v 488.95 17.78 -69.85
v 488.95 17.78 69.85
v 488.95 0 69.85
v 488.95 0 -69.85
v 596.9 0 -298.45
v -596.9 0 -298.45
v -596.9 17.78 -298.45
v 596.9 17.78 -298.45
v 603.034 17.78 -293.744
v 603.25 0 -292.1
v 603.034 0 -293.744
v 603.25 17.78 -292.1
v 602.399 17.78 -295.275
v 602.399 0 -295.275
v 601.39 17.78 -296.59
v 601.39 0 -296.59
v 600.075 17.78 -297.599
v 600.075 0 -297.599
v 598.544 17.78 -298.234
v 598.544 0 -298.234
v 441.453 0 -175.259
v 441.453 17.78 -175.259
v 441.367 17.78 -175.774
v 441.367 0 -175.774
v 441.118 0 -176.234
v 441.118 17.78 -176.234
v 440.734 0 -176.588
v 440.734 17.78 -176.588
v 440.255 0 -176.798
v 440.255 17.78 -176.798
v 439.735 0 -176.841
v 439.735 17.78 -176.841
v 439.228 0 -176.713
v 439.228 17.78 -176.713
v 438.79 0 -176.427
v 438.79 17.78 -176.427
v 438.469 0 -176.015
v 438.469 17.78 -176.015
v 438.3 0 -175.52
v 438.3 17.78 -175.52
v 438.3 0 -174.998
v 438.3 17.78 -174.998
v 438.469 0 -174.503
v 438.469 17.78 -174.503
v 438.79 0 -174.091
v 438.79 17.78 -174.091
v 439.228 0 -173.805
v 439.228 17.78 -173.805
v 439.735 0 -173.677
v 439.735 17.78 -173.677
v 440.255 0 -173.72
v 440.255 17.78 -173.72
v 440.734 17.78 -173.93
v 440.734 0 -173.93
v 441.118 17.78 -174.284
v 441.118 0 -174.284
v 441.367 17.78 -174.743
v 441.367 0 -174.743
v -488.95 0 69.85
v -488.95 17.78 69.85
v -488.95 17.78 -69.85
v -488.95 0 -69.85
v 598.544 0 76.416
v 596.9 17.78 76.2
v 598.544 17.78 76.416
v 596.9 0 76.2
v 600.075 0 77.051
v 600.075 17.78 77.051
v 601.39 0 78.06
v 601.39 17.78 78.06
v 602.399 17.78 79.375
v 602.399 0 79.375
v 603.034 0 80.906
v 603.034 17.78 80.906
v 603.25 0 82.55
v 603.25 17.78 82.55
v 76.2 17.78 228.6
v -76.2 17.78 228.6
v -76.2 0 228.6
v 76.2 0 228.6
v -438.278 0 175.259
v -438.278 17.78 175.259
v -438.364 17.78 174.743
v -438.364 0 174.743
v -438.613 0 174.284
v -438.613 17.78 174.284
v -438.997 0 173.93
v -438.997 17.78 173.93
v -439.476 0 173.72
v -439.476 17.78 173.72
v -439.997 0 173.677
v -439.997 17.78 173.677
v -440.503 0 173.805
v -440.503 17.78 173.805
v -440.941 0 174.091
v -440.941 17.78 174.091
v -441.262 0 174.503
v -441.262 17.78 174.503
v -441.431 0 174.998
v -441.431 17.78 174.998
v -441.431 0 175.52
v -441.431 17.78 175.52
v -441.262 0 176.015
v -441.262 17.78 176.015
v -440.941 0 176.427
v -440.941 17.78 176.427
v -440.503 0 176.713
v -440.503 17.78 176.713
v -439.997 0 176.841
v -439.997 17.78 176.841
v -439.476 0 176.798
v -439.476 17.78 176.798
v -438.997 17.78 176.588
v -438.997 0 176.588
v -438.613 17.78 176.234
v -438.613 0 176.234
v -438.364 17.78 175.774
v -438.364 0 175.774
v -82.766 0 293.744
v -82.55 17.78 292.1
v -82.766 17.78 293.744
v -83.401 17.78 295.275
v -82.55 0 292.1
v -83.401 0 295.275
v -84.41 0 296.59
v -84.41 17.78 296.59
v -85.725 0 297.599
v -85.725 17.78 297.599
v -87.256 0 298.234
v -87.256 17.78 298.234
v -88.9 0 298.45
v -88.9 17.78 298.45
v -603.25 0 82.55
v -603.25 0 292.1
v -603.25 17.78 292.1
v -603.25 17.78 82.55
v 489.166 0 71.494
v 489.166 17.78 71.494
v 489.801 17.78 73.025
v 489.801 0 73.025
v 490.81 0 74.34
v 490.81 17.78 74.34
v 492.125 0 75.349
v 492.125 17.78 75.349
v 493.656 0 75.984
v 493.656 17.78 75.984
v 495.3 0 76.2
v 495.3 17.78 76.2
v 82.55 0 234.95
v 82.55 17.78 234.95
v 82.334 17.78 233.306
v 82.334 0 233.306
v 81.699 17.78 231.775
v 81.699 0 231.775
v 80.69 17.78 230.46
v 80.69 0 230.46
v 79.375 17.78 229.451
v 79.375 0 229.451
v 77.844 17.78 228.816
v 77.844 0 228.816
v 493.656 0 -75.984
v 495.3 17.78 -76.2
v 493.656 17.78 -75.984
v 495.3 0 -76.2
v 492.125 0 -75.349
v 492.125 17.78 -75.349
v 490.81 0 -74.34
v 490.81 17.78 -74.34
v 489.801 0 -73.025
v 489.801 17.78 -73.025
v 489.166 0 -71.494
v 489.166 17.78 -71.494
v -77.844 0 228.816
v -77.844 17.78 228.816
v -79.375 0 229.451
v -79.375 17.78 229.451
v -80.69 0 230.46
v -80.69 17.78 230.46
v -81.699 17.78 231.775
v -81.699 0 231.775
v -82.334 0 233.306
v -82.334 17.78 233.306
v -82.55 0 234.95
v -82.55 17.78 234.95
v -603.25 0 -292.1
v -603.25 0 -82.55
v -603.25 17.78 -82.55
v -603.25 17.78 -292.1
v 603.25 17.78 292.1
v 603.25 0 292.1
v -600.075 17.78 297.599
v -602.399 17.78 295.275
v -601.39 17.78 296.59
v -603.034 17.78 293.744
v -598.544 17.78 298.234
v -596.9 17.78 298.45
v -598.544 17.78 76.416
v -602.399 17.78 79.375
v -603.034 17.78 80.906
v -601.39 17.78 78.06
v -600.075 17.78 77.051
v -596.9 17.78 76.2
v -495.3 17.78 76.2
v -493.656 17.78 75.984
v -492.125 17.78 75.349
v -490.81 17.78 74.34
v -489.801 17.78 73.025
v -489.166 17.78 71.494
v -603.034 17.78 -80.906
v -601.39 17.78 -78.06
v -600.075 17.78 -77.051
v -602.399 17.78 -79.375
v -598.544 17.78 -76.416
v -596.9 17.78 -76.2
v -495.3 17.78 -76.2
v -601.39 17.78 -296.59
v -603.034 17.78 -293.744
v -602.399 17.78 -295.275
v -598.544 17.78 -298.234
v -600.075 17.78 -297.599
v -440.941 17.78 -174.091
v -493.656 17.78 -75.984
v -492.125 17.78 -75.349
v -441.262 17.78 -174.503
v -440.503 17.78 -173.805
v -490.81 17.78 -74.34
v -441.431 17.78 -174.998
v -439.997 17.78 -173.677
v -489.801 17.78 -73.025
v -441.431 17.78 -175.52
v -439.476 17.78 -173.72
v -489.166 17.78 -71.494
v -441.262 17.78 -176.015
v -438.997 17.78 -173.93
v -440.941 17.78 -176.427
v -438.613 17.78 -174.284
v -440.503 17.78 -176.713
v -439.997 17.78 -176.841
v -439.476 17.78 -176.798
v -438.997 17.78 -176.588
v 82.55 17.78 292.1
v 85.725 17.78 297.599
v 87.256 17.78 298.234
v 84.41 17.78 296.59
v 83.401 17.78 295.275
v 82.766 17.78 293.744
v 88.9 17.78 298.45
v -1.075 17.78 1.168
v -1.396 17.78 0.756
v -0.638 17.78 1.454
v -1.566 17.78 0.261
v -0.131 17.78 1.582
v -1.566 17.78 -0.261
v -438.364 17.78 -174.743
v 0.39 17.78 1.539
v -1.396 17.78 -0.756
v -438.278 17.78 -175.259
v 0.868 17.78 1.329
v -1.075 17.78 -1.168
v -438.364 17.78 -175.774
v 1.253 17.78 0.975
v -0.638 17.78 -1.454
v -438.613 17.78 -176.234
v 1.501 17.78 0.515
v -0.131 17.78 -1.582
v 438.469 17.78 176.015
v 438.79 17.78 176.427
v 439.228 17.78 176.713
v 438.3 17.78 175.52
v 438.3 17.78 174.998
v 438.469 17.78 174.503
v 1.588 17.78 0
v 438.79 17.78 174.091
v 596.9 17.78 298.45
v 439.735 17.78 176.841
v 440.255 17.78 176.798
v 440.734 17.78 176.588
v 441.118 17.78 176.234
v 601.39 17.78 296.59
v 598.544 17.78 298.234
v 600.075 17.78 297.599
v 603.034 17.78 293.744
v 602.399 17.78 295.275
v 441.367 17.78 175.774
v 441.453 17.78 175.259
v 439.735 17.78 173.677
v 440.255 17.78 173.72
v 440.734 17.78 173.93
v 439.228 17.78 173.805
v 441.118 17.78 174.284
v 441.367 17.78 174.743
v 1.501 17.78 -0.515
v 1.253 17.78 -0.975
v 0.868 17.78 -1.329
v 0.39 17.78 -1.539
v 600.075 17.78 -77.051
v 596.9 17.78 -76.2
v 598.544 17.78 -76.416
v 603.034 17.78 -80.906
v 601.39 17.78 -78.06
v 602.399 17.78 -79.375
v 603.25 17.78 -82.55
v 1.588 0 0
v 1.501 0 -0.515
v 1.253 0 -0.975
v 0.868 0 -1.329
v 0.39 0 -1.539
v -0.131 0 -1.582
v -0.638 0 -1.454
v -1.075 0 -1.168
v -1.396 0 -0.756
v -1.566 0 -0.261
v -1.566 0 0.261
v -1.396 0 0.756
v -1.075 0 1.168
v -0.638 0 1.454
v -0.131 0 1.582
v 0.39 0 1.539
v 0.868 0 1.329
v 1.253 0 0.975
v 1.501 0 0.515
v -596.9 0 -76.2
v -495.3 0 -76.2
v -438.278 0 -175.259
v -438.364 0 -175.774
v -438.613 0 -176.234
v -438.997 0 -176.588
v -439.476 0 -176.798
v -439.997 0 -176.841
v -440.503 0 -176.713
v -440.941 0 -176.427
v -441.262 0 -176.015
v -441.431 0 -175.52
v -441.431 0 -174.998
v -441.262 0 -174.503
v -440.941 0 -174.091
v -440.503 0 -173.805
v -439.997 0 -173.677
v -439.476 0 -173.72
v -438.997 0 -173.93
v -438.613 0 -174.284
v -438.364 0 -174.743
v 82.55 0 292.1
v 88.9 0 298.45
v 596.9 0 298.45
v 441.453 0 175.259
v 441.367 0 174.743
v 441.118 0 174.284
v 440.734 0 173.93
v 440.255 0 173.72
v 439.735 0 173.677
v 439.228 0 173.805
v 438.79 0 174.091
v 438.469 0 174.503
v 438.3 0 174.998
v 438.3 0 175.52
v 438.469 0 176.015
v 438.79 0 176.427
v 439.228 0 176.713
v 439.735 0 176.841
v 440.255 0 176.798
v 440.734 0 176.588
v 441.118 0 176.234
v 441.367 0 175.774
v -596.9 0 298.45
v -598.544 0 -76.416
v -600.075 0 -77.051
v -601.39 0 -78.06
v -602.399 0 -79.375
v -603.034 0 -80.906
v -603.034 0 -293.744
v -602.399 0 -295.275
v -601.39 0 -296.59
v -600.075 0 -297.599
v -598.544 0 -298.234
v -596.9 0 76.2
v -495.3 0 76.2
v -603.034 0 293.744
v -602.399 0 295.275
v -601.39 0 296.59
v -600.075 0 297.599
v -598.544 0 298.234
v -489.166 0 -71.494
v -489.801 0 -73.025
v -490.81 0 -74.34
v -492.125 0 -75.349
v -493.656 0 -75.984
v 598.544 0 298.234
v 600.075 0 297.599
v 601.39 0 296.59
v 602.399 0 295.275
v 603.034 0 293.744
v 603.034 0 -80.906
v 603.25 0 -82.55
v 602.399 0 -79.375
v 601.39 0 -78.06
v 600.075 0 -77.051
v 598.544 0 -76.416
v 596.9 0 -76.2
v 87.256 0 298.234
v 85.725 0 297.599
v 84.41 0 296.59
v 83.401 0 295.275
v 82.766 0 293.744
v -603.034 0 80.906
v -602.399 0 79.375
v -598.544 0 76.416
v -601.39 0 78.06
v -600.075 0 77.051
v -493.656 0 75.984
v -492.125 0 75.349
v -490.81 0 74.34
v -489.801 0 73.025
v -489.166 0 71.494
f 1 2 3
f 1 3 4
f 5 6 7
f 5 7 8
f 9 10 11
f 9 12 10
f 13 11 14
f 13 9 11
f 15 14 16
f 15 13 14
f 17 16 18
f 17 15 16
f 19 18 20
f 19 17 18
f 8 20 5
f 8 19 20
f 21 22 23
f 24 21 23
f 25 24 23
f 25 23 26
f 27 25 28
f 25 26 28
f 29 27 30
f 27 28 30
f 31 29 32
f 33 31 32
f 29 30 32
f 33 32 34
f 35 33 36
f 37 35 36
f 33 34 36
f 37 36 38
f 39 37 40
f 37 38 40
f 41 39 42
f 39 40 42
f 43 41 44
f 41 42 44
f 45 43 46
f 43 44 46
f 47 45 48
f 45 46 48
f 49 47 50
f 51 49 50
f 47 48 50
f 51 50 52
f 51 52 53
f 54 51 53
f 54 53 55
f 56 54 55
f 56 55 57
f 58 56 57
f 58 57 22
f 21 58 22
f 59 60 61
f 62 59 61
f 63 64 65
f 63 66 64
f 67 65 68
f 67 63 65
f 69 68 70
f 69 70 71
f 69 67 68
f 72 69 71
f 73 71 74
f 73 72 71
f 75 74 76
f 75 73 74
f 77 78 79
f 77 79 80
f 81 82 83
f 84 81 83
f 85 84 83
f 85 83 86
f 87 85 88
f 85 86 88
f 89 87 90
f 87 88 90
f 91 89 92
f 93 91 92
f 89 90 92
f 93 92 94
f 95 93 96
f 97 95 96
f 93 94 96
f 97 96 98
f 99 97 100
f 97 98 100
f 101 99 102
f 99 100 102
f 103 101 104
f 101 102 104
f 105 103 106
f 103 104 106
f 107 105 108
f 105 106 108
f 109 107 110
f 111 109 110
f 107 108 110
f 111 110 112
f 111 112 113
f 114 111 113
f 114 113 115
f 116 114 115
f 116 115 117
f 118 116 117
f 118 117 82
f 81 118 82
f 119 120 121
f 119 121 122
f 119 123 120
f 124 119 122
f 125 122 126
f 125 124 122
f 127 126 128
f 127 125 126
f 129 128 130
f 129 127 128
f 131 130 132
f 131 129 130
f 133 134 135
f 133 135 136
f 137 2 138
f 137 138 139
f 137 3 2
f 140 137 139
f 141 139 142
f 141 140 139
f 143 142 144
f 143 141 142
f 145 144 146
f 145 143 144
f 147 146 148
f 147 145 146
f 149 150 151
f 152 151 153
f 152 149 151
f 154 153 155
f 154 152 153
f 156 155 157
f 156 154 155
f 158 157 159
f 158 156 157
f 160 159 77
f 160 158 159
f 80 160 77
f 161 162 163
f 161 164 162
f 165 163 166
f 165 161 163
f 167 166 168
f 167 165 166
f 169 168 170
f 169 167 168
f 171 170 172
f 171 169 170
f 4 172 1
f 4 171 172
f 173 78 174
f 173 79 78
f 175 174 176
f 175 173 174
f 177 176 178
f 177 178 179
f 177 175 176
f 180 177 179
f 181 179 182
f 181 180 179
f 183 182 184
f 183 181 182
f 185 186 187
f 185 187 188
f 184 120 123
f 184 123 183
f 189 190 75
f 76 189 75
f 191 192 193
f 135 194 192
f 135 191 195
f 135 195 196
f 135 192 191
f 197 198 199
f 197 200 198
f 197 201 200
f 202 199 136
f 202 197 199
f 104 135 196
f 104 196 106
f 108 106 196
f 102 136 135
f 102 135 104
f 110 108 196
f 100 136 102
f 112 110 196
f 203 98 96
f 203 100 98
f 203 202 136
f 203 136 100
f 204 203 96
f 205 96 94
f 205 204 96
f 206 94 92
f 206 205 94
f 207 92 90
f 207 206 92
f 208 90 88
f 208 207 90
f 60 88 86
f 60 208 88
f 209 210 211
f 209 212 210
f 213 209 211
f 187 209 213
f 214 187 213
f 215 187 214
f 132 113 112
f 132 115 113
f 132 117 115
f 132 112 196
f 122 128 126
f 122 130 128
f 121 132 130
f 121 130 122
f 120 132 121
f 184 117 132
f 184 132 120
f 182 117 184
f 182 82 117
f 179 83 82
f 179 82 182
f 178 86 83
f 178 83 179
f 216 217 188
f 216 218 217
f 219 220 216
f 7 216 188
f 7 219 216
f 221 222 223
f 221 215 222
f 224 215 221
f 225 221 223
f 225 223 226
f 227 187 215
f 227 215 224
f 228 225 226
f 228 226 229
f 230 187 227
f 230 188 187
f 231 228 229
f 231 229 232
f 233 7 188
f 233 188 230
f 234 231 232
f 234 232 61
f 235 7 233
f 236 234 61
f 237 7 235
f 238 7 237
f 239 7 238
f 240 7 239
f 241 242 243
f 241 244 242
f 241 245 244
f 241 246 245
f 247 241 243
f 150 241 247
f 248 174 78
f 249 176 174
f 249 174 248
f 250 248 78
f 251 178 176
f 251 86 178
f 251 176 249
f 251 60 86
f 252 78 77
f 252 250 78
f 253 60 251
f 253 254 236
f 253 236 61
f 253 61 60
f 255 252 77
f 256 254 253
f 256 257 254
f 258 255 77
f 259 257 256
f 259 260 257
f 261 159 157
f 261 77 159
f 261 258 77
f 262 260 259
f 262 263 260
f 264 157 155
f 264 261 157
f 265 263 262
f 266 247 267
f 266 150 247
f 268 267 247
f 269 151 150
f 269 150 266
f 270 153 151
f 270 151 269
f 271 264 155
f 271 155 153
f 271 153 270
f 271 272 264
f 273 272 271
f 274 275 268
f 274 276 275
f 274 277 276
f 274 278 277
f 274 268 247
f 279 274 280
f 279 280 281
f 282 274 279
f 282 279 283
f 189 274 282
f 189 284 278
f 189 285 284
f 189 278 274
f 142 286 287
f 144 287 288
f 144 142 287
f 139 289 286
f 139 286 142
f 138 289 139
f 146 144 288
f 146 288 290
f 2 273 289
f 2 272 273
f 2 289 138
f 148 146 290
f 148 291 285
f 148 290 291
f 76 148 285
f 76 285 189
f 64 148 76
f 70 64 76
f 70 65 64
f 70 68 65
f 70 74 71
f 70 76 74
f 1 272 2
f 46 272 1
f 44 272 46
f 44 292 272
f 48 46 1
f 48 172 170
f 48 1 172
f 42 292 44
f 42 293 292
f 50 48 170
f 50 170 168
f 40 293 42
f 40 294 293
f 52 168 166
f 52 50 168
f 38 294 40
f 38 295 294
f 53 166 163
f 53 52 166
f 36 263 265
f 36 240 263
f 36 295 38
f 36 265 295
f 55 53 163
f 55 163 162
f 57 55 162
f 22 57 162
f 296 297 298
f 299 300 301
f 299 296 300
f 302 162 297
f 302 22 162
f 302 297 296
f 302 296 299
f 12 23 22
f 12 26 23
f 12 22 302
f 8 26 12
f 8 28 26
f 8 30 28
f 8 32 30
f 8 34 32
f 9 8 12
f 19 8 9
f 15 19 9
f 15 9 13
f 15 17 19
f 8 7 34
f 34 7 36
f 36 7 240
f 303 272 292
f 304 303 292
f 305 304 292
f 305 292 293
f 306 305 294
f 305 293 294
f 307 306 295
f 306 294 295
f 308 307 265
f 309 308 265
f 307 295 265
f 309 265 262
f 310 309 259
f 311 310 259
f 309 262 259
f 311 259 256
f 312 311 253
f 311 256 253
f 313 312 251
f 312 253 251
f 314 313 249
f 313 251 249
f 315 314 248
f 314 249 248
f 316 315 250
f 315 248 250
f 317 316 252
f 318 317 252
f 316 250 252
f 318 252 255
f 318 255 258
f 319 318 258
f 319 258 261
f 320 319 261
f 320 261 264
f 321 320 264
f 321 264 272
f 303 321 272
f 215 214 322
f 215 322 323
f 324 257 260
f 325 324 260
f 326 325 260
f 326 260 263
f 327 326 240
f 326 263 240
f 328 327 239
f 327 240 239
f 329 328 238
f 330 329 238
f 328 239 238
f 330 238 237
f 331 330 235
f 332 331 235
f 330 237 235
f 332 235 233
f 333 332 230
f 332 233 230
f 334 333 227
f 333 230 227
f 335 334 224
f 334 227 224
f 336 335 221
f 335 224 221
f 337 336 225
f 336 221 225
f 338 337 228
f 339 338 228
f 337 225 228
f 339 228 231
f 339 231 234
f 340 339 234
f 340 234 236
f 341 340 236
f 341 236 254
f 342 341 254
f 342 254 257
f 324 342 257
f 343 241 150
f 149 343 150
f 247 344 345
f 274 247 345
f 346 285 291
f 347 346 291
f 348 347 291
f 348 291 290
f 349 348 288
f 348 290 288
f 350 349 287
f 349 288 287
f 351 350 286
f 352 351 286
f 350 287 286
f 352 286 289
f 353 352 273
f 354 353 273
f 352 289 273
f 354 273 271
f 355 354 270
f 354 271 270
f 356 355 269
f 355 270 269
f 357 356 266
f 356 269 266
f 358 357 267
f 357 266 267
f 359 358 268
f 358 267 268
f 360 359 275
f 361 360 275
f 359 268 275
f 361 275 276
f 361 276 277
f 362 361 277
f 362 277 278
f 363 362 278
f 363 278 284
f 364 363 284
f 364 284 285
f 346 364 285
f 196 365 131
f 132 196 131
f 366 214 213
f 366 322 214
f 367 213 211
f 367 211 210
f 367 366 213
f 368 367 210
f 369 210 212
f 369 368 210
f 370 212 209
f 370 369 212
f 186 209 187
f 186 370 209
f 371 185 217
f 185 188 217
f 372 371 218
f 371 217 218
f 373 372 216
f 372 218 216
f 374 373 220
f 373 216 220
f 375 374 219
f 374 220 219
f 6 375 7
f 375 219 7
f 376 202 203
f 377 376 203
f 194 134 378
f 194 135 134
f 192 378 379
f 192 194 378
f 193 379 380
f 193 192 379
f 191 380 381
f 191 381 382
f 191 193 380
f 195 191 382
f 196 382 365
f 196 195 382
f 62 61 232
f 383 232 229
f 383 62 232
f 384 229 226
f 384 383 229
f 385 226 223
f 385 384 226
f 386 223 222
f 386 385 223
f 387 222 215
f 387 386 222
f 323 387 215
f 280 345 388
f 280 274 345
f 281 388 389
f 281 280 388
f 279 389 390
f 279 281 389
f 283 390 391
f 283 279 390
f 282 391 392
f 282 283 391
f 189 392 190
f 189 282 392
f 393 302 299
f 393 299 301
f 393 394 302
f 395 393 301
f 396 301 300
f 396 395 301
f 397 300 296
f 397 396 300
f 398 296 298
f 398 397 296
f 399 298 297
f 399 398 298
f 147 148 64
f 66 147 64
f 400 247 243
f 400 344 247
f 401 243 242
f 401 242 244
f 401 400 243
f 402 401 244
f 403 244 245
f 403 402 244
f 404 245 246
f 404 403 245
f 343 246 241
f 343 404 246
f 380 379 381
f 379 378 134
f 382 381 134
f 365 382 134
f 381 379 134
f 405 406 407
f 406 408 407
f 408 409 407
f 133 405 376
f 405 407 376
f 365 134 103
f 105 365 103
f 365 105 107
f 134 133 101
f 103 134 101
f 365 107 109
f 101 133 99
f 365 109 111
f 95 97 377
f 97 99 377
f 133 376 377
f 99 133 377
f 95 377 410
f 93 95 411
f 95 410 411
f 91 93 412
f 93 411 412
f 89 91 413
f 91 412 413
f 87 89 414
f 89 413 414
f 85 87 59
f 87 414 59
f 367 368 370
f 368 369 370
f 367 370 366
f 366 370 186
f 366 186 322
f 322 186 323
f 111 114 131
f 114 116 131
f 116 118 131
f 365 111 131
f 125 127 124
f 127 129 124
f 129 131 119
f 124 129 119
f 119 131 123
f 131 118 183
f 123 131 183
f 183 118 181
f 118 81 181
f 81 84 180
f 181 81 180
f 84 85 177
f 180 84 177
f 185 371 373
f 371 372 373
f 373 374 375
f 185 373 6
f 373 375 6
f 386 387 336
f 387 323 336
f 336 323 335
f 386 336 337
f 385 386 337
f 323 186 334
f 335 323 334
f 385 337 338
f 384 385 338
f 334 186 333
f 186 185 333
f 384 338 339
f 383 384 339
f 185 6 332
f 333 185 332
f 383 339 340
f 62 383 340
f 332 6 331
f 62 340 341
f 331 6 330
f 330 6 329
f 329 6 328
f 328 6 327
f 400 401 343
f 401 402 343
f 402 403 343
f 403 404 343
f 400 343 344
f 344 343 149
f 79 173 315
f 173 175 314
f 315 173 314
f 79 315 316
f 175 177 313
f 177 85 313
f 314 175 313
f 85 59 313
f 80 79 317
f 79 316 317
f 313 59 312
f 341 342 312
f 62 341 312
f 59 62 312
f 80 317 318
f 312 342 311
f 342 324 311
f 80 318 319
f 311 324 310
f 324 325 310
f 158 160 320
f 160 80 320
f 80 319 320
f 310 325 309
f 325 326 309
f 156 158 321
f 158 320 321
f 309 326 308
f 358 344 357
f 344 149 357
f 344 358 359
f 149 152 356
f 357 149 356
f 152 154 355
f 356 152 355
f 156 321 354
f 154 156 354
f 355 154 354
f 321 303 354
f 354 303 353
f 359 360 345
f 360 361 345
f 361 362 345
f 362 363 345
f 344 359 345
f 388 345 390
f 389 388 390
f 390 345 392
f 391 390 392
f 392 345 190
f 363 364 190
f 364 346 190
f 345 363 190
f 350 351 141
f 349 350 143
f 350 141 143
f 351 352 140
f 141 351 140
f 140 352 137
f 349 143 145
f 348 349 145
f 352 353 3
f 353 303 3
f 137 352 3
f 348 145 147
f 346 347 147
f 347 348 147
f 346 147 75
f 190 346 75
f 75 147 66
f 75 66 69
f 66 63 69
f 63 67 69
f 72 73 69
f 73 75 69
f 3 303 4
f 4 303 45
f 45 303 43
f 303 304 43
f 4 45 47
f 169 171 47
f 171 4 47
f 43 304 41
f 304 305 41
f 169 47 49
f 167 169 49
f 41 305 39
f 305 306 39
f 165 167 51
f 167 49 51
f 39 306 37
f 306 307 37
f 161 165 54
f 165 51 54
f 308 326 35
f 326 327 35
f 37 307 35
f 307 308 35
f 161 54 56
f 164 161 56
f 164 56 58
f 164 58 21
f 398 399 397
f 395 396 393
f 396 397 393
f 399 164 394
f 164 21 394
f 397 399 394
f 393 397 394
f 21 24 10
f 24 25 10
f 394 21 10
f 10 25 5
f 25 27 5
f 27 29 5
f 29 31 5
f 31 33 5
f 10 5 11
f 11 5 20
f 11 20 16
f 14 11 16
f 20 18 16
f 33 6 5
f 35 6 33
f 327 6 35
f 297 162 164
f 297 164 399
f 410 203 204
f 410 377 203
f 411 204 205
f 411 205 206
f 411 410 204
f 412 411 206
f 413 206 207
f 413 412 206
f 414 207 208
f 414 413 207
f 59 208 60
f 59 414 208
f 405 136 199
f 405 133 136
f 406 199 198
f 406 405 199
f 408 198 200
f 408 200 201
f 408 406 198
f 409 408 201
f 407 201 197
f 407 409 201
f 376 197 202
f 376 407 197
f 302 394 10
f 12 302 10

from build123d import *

# Parameters (mm, degrees)
SKETCH1_W                    = 1206.5
SKETCH1_H                    = 596.9
BOSS_EXTRUDE1_DEPTH          = 17.78
FILLET1_R                    = 6.35
SKETCH4_W                    = 165.1
SKETCH4_H                    = 69.85
SKETCH4_W_2                  = 114.3
SKETCH4_H_2                  = 152.4
CUT_EXTRUDE1_DEPTH           = 18.78
FILLET2_R                    = 6.35
F_1_8_0_125_DIAMETER_HOLE2_D = 3.175


with BuildPart() as part:
    # Sketch1 → Boss-Extrude1 (new body)
    with BuildSketch(Plane(origin=(0, 0, 0), x_dir=(1, 0, 0), z_dir=(0, 1, 0))):
        Rectangle(SKETCH1_W, SKETCH1_H)
    extrude(amount=BOSS_EXTRUDE1_DEPTH)

    # Fillet1
    fillet1_edges = [part.edges().sort_by_distance(p)[0] for p in [
        (603.25, 8.89, 298.45),
        (-603.25, 8.89, 298.45),
        (-603.25, 8.89, -298.45),
        (603.25, 8.89, -298.45),
    ]]
    fillet(fillet1_edges, radius=FILLET1_R)

    # Sketch4 → Cut-Extrude1 (cut, through all)
    with BuildSketch(Plane(origin=(0, 17.78, 0), x_dir=(1, 0, 0), z_dir=(0, 1, 0))):
        with Locations((0, -263.525)):
            Rectangle(SKETCH4_W, SKETCH4_H)
        with Locations((-546.1, 0)):
            Rectangle(SKETCH4_W_2, SKETCH4_H_2)
        with Locations((546.1, 0)):
            Rectangle(SKETCH4_W_2, SKETCH4_H_2)
    extrude(amount=-CUT_EXTRUDE1_DEPTH, mode=Mode.SUBTRACT)

    # Fillet2
    fillet2_edges = [part.edges().sort_by_distance(p)[0] for p in [
        (82.55, 8.89, 228.6),
        (82.55, 8.89, 298.45),
        (-82.55, 8.89, 298.45),
        (-82.55, 8.89, 228.6),
        (-603.25, 8.89, 76.2),
        (-603.25, 8.89, -76.2),
        (-488.95, 8.89, -76.2),
        (-488.95, 8.89, 76.2),
        (603.25, 8.89, -76.2),
        (603.25, 8.89, 76.2),
        (488.95, 8.89, 76.2),
        (488.95, 8.89, -76.2),
    ]]
    fillet(fillet2_edges, radius=FILLET2_R)

    # 1/8 (0.125) Diameter Hole2 (through all)
    with Locations(Plane(origin=(0, 0, 0), x_dir=(-1, 0, 0), z_dir=(0, -1, 0))):
        with Locations((-439.865615282, 175.258956089), (439.865615282, 175.258956089), (439.865615282, -175.258956089), (0, 0), (-439.865615282, -175.258956089)):
            Hole(F_1_8_0_125_DIAMETER_HOLE2_D / 2)


solid = part.part
